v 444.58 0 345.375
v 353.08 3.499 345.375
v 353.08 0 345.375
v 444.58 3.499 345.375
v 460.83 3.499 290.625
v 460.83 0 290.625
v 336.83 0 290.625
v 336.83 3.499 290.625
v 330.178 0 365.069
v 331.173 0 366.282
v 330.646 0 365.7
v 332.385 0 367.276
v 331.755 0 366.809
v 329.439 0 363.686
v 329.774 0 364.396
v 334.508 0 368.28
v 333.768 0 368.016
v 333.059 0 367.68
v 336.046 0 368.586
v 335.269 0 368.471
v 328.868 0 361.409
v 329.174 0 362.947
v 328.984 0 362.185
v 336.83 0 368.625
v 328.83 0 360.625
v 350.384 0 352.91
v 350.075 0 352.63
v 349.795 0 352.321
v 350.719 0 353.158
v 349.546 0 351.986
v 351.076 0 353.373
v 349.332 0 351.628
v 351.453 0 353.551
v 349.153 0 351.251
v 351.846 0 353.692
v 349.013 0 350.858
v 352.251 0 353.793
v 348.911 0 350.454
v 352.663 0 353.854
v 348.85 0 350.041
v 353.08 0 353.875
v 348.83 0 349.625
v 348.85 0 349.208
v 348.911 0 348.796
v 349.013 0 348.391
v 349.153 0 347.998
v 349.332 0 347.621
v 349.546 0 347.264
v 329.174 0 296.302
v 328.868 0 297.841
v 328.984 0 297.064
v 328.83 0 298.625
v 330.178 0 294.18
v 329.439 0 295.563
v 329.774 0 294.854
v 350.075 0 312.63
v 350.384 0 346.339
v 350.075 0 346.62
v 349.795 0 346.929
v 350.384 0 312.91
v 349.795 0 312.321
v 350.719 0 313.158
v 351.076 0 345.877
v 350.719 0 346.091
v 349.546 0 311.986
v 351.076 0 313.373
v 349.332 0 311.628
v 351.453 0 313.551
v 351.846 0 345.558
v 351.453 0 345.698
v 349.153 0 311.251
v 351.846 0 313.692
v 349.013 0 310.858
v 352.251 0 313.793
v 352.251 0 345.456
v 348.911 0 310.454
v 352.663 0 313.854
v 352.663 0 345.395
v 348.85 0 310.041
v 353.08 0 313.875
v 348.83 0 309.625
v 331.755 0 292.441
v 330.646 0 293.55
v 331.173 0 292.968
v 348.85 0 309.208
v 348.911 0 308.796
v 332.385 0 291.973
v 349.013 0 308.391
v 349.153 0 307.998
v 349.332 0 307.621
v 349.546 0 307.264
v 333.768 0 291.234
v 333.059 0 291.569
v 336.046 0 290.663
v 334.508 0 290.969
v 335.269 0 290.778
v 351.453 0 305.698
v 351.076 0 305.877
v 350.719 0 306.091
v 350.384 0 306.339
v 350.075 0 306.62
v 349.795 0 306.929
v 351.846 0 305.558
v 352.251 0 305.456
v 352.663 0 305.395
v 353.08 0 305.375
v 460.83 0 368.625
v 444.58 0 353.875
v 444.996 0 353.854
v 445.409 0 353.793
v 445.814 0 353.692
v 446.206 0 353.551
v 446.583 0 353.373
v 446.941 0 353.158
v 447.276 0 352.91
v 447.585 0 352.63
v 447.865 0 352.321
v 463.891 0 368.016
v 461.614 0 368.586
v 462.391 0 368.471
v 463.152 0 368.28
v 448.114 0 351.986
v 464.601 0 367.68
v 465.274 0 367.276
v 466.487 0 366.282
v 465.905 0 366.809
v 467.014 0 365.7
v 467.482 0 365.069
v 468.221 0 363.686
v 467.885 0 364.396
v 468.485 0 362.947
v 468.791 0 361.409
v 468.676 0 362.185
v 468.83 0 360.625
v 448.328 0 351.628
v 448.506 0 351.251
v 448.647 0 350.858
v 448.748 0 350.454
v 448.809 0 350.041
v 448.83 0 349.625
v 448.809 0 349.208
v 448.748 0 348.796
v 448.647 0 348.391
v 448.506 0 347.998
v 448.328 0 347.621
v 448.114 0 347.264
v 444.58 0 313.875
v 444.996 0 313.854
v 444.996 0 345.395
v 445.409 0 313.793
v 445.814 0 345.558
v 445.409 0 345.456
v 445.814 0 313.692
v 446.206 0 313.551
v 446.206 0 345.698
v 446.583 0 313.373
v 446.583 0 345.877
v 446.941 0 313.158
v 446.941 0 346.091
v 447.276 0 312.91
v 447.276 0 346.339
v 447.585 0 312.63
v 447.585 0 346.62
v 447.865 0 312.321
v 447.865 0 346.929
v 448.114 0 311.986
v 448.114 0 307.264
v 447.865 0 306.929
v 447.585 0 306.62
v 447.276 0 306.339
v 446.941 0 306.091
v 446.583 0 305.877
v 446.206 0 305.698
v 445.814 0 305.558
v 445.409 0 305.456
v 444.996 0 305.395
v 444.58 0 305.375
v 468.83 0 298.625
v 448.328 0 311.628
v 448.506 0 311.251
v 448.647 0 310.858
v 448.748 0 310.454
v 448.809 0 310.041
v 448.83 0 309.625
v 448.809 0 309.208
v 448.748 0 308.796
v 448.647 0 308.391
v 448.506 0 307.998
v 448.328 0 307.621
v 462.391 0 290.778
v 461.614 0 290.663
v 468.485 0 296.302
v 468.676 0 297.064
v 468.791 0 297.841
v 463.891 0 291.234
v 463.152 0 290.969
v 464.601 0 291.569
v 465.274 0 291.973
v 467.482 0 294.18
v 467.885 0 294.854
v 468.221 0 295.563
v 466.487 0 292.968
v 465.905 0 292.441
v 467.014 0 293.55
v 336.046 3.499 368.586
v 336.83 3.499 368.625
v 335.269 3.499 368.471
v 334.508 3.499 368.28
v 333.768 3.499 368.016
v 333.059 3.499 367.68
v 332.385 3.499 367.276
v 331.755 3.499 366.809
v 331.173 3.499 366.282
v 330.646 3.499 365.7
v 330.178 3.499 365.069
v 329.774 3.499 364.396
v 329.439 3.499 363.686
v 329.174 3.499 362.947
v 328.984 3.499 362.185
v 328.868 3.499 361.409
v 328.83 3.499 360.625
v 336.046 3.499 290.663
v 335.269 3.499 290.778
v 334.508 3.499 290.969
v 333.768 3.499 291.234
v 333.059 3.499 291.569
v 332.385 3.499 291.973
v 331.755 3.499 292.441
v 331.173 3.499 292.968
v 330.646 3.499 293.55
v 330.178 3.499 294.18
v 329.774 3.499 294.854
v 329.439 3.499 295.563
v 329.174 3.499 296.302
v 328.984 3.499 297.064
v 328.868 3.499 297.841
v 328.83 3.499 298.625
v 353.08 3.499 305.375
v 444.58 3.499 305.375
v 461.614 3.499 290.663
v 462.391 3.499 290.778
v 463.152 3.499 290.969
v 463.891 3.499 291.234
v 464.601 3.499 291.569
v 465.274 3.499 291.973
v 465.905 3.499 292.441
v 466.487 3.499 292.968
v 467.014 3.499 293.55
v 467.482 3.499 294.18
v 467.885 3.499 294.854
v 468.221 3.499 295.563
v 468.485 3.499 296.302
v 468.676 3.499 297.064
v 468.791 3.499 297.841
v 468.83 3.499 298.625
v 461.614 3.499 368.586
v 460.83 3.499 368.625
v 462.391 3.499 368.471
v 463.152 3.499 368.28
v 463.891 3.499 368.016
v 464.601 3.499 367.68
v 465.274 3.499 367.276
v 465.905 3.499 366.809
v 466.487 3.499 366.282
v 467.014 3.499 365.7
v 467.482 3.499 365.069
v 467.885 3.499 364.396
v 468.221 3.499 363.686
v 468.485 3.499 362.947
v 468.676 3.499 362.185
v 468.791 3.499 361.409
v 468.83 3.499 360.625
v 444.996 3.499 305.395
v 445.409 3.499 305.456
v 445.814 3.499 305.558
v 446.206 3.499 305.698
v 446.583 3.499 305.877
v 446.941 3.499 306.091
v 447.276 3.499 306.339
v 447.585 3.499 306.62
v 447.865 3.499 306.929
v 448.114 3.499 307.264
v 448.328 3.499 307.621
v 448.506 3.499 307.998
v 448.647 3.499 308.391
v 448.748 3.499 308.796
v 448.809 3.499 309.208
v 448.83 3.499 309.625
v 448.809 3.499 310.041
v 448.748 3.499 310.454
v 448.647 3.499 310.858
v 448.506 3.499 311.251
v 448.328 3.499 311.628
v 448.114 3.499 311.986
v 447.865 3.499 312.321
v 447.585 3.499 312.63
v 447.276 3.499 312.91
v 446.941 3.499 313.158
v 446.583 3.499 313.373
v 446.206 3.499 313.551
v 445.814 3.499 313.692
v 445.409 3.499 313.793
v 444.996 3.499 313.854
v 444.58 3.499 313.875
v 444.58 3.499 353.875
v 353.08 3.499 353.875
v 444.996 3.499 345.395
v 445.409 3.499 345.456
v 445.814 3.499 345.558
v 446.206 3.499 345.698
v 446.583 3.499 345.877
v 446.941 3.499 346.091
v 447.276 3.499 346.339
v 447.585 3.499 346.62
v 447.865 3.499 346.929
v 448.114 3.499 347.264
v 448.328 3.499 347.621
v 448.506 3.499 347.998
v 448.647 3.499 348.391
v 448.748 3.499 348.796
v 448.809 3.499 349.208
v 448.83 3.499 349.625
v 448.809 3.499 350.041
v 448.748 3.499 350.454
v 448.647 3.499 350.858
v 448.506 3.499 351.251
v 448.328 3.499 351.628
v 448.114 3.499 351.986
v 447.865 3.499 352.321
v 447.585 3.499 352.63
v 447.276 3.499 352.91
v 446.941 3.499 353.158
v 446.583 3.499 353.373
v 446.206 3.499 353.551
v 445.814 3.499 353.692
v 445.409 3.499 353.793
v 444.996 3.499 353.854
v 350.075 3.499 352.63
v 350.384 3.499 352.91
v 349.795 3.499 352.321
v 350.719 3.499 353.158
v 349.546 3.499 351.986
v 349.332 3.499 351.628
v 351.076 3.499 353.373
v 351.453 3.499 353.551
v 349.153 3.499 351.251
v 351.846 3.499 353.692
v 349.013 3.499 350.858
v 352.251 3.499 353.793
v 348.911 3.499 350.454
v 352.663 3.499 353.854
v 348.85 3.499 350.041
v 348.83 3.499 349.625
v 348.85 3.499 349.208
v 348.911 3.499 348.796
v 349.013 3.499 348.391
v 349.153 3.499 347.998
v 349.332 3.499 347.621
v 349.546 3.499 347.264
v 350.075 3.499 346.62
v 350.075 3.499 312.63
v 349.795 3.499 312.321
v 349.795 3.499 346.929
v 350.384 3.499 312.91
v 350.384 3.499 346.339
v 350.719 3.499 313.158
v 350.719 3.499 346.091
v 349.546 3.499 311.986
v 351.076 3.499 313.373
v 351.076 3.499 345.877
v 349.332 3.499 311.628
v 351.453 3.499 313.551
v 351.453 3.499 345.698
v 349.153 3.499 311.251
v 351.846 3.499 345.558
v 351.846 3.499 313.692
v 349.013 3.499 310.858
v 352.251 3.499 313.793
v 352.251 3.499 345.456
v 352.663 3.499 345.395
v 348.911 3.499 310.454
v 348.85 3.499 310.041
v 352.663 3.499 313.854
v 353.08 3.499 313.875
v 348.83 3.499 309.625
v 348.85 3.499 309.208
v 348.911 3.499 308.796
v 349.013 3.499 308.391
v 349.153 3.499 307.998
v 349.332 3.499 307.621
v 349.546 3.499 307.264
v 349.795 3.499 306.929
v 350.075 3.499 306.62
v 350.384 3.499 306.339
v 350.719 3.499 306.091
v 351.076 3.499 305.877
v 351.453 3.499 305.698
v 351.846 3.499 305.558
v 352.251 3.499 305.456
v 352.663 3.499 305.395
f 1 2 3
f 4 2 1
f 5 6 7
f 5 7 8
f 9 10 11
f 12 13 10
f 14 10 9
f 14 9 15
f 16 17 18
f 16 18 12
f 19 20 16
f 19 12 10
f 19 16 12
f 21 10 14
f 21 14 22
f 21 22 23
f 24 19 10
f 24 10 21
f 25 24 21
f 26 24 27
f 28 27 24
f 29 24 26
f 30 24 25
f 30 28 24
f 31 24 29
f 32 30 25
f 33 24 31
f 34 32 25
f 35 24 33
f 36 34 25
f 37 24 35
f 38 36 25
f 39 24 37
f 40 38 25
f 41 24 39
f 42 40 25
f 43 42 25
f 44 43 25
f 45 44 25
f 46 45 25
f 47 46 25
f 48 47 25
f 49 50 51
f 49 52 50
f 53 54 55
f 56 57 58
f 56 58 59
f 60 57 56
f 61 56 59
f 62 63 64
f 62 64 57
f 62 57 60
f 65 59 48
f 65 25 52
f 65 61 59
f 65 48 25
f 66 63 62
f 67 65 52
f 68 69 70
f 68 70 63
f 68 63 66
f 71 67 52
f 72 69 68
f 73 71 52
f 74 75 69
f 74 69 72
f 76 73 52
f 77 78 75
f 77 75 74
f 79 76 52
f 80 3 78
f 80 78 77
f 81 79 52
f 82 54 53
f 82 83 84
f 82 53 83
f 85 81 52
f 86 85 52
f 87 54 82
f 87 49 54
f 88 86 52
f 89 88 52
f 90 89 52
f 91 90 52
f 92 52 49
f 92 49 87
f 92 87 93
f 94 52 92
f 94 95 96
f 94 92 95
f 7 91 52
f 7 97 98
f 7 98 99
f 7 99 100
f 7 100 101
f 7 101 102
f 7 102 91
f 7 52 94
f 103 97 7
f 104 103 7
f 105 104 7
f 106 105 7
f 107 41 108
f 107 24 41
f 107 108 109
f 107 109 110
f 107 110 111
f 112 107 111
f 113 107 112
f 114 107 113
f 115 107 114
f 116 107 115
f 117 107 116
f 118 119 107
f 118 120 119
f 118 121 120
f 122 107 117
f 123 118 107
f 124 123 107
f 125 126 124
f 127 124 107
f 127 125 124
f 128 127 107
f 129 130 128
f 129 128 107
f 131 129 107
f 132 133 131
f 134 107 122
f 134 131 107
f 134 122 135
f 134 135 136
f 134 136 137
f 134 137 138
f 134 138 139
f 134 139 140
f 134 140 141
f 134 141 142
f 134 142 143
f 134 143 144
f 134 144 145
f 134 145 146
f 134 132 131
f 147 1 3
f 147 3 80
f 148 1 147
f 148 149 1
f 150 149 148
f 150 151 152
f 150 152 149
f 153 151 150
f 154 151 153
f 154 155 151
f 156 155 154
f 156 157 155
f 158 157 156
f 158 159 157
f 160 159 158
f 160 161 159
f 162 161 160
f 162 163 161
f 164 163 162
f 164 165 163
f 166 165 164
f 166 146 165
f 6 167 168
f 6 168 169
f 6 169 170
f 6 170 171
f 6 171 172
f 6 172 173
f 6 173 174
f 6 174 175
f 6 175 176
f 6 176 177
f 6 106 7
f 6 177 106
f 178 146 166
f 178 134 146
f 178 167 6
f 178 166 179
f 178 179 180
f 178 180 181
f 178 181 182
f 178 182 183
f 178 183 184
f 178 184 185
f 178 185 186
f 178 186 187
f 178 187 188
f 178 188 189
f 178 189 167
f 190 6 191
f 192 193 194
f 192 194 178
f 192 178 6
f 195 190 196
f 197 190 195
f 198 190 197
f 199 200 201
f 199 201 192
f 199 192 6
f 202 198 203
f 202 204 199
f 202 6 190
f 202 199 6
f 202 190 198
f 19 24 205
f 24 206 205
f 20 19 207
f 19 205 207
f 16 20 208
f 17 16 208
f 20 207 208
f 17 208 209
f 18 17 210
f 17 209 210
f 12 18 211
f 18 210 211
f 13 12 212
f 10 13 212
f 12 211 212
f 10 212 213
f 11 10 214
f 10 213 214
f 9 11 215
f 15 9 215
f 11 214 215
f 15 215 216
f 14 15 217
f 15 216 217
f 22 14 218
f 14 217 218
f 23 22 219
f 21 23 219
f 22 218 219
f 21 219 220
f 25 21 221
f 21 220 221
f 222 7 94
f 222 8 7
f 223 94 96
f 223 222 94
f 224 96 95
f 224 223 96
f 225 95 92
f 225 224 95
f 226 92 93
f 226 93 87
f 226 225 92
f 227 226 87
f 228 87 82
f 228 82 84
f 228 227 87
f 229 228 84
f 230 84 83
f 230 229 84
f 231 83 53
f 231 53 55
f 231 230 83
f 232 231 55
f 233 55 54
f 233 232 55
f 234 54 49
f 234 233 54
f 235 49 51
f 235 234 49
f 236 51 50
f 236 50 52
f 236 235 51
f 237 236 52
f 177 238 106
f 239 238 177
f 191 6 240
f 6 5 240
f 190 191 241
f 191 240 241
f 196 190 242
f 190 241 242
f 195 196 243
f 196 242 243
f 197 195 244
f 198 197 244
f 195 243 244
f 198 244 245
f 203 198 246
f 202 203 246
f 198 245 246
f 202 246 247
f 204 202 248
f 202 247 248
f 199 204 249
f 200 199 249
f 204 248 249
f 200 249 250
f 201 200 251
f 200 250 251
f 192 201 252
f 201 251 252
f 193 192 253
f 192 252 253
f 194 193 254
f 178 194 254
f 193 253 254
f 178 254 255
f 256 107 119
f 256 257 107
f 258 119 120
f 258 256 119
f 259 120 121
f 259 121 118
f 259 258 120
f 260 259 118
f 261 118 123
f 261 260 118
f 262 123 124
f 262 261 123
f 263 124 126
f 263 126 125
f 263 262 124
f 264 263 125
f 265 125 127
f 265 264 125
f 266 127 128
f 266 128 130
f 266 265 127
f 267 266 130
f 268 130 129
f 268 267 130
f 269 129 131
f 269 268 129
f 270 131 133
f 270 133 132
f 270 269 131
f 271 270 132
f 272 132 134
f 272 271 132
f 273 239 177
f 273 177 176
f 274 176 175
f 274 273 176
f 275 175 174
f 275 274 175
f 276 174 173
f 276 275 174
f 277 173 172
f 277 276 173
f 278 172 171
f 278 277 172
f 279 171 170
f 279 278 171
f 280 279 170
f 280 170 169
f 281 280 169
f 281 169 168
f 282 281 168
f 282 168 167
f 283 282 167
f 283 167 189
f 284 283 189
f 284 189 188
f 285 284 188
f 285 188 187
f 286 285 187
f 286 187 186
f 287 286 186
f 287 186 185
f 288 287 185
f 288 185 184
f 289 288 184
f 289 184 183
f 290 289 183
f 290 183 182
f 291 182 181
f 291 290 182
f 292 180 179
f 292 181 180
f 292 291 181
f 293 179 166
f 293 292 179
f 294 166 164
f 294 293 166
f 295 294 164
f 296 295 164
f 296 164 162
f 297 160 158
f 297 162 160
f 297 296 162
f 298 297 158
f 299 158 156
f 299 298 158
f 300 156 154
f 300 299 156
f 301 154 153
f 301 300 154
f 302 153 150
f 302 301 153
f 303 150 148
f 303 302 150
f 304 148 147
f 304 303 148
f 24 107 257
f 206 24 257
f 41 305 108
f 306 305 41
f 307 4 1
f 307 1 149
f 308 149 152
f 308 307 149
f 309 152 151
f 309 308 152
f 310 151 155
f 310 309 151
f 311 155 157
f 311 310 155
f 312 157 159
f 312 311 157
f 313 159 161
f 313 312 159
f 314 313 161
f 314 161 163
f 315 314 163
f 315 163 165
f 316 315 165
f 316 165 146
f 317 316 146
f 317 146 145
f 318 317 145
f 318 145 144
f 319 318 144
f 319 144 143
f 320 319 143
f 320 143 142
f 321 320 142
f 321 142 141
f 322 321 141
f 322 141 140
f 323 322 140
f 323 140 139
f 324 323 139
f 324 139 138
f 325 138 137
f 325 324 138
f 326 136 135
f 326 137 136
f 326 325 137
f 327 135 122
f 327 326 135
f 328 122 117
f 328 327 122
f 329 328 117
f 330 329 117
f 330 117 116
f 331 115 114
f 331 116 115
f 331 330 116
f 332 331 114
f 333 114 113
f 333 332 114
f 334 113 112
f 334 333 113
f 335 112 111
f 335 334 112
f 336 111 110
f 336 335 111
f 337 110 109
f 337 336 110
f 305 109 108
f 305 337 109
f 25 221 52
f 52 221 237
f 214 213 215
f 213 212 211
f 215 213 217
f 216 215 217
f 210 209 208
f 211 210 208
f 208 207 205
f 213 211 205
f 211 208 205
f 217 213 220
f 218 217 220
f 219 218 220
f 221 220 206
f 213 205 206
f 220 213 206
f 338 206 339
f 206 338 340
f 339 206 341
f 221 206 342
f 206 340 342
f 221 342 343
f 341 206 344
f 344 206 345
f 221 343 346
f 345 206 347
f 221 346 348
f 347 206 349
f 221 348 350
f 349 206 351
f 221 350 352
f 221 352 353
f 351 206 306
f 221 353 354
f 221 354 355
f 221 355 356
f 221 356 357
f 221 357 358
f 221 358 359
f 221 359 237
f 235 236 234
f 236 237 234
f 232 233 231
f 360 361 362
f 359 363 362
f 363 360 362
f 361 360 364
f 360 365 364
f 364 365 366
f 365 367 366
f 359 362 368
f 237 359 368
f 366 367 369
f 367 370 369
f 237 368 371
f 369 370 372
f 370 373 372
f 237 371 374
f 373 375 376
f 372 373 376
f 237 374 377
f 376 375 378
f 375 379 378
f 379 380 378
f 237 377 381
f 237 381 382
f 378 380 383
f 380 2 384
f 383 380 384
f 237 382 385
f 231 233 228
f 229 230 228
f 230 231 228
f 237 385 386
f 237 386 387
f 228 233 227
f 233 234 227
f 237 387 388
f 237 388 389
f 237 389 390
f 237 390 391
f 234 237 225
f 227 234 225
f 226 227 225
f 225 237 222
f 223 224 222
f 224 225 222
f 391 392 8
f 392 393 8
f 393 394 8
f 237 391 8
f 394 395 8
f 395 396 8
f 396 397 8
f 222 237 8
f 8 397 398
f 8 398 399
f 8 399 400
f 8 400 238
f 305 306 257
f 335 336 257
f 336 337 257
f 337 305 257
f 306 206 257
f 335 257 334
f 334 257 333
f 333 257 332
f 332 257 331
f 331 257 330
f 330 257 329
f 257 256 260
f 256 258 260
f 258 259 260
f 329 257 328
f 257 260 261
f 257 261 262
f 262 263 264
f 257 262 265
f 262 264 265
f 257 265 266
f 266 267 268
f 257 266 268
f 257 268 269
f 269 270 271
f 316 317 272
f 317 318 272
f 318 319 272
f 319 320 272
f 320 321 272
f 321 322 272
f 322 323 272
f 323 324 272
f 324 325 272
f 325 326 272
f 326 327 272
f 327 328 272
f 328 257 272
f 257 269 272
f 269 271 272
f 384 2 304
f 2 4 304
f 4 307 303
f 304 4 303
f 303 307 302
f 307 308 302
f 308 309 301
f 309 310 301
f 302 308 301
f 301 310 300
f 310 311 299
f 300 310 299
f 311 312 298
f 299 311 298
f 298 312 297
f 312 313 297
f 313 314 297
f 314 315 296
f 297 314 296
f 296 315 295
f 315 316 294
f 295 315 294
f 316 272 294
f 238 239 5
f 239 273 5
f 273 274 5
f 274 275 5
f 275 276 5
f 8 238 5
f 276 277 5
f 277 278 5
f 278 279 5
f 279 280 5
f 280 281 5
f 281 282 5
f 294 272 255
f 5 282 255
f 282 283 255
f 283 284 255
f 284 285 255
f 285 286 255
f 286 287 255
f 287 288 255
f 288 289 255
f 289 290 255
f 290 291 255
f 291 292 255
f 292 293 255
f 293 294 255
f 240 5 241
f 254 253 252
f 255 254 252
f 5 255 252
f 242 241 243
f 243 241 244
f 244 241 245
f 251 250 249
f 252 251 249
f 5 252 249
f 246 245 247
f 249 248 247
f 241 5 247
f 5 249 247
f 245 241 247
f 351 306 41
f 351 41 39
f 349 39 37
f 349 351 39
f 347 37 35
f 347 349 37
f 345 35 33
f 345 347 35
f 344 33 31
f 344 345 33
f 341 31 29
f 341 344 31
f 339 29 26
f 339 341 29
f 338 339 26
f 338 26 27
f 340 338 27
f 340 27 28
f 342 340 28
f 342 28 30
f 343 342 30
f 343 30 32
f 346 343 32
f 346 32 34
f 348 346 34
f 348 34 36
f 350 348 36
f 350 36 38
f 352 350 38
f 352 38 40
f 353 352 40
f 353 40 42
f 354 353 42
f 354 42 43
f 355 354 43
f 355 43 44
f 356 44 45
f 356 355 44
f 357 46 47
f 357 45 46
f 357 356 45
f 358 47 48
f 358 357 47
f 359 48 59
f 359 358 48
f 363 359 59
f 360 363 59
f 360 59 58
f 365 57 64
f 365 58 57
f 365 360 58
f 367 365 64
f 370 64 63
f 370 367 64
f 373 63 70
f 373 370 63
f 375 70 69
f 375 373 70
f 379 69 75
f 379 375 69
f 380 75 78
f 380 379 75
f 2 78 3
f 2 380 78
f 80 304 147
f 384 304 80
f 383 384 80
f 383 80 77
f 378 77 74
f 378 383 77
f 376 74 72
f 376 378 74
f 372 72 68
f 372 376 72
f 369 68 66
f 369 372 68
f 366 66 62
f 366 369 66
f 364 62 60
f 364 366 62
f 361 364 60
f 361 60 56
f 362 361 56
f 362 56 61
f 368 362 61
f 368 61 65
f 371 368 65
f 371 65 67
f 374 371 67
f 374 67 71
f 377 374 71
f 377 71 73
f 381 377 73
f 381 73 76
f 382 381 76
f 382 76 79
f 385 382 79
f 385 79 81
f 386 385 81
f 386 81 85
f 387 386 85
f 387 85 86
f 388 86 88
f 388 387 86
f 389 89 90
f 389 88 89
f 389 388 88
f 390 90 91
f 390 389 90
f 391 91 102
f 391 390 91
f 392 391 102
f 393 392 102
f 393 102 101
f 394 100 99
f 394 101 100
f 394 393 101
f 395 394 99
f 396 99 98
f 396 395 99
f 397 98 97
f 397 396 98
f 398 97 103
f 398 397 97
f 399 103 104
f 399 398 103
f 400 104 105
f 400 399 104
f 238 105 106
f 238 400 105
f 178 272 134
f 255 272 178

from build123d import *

# Parameters (mm, degrees)
SKETCH1_W           = 78
SKETCH1_H           = 3.498668771
BOSS_EXTRUDE1_DEPTH = 140
FILLET1_R           = 8
CUT_EXTRUDE1_DEPTH  = 10


with BuildPart() as part:
    # Sketch1 → Boss-Extrude1 (new body)
    with BuildSketch(Plane(origin=(468.829800242, 0, 0), x_dir=(0, 0, -1), z_dir=(1, 0, 0))):
        with Locations((-329.624739584, 1.749334386)):
            Rectangle(SKETCH1_W, SKETCH1_H)
    extrude(amount=-BOSS_EXTRUDE1_DEPTH)

    # Fillet1
    fillet1_edges = [part.edges().sort_by_distance(p)[0] for p in [
        (468.829800242, 1.749334385, 290.624739584),
        (328.829800242, 1.749334385, 290.624739584),
        (328.829800242, 1.749334385, 368.624739584),
        (468.829800242, 1.749334385, 368.624739584),
    ]]
    fillet(fillet1_edges, radius=FILLET1_R)

    # Sketch3 → Cut-Extrude1 (cut)
    with BuildSketch(Plane(origin=(0, 3.498668771, 0), x_dir=(1, 0, 0), z_dir=(0, 1, 0))):
        with BuildLine():
            Line((353.079800242, -345.374739584), (444.579800242, -345.374739584))
            ThreePointArc((444.579800242, -345.374739584), (448.829800242, -349.624739584), (444.579800242, -353.874739584))
            Line((444.579800242, -353.874739584), (353.079800242, -353.874739584))
            ThreePointArc((353.079800242, -353.874739584), (348.829800242, -349.624739584), (353.079800242, -345.374739584))
        make_face()
        with BuildLine():
            Line((353.079800242, -305.374739584), (444.579800242, -305.374739584))
            ThreePointArc((444.579800242, -305.374739584), (448.829800242, -309.624739584), (444.579800242, -313.874739584))
            Line((444.579800242, -313.874739584), (353.079800242, -313.874739584))
            ThreePointArc((353.079800242, -313.874739584), (348.829800242, -309.624739584), (353.079800242, -305.374739584))
        make_face()
    extrude(amount=-CUT_EXTRUDE1_DEPTH, mode=Mode.SUBTRACT)


solid = part.part
